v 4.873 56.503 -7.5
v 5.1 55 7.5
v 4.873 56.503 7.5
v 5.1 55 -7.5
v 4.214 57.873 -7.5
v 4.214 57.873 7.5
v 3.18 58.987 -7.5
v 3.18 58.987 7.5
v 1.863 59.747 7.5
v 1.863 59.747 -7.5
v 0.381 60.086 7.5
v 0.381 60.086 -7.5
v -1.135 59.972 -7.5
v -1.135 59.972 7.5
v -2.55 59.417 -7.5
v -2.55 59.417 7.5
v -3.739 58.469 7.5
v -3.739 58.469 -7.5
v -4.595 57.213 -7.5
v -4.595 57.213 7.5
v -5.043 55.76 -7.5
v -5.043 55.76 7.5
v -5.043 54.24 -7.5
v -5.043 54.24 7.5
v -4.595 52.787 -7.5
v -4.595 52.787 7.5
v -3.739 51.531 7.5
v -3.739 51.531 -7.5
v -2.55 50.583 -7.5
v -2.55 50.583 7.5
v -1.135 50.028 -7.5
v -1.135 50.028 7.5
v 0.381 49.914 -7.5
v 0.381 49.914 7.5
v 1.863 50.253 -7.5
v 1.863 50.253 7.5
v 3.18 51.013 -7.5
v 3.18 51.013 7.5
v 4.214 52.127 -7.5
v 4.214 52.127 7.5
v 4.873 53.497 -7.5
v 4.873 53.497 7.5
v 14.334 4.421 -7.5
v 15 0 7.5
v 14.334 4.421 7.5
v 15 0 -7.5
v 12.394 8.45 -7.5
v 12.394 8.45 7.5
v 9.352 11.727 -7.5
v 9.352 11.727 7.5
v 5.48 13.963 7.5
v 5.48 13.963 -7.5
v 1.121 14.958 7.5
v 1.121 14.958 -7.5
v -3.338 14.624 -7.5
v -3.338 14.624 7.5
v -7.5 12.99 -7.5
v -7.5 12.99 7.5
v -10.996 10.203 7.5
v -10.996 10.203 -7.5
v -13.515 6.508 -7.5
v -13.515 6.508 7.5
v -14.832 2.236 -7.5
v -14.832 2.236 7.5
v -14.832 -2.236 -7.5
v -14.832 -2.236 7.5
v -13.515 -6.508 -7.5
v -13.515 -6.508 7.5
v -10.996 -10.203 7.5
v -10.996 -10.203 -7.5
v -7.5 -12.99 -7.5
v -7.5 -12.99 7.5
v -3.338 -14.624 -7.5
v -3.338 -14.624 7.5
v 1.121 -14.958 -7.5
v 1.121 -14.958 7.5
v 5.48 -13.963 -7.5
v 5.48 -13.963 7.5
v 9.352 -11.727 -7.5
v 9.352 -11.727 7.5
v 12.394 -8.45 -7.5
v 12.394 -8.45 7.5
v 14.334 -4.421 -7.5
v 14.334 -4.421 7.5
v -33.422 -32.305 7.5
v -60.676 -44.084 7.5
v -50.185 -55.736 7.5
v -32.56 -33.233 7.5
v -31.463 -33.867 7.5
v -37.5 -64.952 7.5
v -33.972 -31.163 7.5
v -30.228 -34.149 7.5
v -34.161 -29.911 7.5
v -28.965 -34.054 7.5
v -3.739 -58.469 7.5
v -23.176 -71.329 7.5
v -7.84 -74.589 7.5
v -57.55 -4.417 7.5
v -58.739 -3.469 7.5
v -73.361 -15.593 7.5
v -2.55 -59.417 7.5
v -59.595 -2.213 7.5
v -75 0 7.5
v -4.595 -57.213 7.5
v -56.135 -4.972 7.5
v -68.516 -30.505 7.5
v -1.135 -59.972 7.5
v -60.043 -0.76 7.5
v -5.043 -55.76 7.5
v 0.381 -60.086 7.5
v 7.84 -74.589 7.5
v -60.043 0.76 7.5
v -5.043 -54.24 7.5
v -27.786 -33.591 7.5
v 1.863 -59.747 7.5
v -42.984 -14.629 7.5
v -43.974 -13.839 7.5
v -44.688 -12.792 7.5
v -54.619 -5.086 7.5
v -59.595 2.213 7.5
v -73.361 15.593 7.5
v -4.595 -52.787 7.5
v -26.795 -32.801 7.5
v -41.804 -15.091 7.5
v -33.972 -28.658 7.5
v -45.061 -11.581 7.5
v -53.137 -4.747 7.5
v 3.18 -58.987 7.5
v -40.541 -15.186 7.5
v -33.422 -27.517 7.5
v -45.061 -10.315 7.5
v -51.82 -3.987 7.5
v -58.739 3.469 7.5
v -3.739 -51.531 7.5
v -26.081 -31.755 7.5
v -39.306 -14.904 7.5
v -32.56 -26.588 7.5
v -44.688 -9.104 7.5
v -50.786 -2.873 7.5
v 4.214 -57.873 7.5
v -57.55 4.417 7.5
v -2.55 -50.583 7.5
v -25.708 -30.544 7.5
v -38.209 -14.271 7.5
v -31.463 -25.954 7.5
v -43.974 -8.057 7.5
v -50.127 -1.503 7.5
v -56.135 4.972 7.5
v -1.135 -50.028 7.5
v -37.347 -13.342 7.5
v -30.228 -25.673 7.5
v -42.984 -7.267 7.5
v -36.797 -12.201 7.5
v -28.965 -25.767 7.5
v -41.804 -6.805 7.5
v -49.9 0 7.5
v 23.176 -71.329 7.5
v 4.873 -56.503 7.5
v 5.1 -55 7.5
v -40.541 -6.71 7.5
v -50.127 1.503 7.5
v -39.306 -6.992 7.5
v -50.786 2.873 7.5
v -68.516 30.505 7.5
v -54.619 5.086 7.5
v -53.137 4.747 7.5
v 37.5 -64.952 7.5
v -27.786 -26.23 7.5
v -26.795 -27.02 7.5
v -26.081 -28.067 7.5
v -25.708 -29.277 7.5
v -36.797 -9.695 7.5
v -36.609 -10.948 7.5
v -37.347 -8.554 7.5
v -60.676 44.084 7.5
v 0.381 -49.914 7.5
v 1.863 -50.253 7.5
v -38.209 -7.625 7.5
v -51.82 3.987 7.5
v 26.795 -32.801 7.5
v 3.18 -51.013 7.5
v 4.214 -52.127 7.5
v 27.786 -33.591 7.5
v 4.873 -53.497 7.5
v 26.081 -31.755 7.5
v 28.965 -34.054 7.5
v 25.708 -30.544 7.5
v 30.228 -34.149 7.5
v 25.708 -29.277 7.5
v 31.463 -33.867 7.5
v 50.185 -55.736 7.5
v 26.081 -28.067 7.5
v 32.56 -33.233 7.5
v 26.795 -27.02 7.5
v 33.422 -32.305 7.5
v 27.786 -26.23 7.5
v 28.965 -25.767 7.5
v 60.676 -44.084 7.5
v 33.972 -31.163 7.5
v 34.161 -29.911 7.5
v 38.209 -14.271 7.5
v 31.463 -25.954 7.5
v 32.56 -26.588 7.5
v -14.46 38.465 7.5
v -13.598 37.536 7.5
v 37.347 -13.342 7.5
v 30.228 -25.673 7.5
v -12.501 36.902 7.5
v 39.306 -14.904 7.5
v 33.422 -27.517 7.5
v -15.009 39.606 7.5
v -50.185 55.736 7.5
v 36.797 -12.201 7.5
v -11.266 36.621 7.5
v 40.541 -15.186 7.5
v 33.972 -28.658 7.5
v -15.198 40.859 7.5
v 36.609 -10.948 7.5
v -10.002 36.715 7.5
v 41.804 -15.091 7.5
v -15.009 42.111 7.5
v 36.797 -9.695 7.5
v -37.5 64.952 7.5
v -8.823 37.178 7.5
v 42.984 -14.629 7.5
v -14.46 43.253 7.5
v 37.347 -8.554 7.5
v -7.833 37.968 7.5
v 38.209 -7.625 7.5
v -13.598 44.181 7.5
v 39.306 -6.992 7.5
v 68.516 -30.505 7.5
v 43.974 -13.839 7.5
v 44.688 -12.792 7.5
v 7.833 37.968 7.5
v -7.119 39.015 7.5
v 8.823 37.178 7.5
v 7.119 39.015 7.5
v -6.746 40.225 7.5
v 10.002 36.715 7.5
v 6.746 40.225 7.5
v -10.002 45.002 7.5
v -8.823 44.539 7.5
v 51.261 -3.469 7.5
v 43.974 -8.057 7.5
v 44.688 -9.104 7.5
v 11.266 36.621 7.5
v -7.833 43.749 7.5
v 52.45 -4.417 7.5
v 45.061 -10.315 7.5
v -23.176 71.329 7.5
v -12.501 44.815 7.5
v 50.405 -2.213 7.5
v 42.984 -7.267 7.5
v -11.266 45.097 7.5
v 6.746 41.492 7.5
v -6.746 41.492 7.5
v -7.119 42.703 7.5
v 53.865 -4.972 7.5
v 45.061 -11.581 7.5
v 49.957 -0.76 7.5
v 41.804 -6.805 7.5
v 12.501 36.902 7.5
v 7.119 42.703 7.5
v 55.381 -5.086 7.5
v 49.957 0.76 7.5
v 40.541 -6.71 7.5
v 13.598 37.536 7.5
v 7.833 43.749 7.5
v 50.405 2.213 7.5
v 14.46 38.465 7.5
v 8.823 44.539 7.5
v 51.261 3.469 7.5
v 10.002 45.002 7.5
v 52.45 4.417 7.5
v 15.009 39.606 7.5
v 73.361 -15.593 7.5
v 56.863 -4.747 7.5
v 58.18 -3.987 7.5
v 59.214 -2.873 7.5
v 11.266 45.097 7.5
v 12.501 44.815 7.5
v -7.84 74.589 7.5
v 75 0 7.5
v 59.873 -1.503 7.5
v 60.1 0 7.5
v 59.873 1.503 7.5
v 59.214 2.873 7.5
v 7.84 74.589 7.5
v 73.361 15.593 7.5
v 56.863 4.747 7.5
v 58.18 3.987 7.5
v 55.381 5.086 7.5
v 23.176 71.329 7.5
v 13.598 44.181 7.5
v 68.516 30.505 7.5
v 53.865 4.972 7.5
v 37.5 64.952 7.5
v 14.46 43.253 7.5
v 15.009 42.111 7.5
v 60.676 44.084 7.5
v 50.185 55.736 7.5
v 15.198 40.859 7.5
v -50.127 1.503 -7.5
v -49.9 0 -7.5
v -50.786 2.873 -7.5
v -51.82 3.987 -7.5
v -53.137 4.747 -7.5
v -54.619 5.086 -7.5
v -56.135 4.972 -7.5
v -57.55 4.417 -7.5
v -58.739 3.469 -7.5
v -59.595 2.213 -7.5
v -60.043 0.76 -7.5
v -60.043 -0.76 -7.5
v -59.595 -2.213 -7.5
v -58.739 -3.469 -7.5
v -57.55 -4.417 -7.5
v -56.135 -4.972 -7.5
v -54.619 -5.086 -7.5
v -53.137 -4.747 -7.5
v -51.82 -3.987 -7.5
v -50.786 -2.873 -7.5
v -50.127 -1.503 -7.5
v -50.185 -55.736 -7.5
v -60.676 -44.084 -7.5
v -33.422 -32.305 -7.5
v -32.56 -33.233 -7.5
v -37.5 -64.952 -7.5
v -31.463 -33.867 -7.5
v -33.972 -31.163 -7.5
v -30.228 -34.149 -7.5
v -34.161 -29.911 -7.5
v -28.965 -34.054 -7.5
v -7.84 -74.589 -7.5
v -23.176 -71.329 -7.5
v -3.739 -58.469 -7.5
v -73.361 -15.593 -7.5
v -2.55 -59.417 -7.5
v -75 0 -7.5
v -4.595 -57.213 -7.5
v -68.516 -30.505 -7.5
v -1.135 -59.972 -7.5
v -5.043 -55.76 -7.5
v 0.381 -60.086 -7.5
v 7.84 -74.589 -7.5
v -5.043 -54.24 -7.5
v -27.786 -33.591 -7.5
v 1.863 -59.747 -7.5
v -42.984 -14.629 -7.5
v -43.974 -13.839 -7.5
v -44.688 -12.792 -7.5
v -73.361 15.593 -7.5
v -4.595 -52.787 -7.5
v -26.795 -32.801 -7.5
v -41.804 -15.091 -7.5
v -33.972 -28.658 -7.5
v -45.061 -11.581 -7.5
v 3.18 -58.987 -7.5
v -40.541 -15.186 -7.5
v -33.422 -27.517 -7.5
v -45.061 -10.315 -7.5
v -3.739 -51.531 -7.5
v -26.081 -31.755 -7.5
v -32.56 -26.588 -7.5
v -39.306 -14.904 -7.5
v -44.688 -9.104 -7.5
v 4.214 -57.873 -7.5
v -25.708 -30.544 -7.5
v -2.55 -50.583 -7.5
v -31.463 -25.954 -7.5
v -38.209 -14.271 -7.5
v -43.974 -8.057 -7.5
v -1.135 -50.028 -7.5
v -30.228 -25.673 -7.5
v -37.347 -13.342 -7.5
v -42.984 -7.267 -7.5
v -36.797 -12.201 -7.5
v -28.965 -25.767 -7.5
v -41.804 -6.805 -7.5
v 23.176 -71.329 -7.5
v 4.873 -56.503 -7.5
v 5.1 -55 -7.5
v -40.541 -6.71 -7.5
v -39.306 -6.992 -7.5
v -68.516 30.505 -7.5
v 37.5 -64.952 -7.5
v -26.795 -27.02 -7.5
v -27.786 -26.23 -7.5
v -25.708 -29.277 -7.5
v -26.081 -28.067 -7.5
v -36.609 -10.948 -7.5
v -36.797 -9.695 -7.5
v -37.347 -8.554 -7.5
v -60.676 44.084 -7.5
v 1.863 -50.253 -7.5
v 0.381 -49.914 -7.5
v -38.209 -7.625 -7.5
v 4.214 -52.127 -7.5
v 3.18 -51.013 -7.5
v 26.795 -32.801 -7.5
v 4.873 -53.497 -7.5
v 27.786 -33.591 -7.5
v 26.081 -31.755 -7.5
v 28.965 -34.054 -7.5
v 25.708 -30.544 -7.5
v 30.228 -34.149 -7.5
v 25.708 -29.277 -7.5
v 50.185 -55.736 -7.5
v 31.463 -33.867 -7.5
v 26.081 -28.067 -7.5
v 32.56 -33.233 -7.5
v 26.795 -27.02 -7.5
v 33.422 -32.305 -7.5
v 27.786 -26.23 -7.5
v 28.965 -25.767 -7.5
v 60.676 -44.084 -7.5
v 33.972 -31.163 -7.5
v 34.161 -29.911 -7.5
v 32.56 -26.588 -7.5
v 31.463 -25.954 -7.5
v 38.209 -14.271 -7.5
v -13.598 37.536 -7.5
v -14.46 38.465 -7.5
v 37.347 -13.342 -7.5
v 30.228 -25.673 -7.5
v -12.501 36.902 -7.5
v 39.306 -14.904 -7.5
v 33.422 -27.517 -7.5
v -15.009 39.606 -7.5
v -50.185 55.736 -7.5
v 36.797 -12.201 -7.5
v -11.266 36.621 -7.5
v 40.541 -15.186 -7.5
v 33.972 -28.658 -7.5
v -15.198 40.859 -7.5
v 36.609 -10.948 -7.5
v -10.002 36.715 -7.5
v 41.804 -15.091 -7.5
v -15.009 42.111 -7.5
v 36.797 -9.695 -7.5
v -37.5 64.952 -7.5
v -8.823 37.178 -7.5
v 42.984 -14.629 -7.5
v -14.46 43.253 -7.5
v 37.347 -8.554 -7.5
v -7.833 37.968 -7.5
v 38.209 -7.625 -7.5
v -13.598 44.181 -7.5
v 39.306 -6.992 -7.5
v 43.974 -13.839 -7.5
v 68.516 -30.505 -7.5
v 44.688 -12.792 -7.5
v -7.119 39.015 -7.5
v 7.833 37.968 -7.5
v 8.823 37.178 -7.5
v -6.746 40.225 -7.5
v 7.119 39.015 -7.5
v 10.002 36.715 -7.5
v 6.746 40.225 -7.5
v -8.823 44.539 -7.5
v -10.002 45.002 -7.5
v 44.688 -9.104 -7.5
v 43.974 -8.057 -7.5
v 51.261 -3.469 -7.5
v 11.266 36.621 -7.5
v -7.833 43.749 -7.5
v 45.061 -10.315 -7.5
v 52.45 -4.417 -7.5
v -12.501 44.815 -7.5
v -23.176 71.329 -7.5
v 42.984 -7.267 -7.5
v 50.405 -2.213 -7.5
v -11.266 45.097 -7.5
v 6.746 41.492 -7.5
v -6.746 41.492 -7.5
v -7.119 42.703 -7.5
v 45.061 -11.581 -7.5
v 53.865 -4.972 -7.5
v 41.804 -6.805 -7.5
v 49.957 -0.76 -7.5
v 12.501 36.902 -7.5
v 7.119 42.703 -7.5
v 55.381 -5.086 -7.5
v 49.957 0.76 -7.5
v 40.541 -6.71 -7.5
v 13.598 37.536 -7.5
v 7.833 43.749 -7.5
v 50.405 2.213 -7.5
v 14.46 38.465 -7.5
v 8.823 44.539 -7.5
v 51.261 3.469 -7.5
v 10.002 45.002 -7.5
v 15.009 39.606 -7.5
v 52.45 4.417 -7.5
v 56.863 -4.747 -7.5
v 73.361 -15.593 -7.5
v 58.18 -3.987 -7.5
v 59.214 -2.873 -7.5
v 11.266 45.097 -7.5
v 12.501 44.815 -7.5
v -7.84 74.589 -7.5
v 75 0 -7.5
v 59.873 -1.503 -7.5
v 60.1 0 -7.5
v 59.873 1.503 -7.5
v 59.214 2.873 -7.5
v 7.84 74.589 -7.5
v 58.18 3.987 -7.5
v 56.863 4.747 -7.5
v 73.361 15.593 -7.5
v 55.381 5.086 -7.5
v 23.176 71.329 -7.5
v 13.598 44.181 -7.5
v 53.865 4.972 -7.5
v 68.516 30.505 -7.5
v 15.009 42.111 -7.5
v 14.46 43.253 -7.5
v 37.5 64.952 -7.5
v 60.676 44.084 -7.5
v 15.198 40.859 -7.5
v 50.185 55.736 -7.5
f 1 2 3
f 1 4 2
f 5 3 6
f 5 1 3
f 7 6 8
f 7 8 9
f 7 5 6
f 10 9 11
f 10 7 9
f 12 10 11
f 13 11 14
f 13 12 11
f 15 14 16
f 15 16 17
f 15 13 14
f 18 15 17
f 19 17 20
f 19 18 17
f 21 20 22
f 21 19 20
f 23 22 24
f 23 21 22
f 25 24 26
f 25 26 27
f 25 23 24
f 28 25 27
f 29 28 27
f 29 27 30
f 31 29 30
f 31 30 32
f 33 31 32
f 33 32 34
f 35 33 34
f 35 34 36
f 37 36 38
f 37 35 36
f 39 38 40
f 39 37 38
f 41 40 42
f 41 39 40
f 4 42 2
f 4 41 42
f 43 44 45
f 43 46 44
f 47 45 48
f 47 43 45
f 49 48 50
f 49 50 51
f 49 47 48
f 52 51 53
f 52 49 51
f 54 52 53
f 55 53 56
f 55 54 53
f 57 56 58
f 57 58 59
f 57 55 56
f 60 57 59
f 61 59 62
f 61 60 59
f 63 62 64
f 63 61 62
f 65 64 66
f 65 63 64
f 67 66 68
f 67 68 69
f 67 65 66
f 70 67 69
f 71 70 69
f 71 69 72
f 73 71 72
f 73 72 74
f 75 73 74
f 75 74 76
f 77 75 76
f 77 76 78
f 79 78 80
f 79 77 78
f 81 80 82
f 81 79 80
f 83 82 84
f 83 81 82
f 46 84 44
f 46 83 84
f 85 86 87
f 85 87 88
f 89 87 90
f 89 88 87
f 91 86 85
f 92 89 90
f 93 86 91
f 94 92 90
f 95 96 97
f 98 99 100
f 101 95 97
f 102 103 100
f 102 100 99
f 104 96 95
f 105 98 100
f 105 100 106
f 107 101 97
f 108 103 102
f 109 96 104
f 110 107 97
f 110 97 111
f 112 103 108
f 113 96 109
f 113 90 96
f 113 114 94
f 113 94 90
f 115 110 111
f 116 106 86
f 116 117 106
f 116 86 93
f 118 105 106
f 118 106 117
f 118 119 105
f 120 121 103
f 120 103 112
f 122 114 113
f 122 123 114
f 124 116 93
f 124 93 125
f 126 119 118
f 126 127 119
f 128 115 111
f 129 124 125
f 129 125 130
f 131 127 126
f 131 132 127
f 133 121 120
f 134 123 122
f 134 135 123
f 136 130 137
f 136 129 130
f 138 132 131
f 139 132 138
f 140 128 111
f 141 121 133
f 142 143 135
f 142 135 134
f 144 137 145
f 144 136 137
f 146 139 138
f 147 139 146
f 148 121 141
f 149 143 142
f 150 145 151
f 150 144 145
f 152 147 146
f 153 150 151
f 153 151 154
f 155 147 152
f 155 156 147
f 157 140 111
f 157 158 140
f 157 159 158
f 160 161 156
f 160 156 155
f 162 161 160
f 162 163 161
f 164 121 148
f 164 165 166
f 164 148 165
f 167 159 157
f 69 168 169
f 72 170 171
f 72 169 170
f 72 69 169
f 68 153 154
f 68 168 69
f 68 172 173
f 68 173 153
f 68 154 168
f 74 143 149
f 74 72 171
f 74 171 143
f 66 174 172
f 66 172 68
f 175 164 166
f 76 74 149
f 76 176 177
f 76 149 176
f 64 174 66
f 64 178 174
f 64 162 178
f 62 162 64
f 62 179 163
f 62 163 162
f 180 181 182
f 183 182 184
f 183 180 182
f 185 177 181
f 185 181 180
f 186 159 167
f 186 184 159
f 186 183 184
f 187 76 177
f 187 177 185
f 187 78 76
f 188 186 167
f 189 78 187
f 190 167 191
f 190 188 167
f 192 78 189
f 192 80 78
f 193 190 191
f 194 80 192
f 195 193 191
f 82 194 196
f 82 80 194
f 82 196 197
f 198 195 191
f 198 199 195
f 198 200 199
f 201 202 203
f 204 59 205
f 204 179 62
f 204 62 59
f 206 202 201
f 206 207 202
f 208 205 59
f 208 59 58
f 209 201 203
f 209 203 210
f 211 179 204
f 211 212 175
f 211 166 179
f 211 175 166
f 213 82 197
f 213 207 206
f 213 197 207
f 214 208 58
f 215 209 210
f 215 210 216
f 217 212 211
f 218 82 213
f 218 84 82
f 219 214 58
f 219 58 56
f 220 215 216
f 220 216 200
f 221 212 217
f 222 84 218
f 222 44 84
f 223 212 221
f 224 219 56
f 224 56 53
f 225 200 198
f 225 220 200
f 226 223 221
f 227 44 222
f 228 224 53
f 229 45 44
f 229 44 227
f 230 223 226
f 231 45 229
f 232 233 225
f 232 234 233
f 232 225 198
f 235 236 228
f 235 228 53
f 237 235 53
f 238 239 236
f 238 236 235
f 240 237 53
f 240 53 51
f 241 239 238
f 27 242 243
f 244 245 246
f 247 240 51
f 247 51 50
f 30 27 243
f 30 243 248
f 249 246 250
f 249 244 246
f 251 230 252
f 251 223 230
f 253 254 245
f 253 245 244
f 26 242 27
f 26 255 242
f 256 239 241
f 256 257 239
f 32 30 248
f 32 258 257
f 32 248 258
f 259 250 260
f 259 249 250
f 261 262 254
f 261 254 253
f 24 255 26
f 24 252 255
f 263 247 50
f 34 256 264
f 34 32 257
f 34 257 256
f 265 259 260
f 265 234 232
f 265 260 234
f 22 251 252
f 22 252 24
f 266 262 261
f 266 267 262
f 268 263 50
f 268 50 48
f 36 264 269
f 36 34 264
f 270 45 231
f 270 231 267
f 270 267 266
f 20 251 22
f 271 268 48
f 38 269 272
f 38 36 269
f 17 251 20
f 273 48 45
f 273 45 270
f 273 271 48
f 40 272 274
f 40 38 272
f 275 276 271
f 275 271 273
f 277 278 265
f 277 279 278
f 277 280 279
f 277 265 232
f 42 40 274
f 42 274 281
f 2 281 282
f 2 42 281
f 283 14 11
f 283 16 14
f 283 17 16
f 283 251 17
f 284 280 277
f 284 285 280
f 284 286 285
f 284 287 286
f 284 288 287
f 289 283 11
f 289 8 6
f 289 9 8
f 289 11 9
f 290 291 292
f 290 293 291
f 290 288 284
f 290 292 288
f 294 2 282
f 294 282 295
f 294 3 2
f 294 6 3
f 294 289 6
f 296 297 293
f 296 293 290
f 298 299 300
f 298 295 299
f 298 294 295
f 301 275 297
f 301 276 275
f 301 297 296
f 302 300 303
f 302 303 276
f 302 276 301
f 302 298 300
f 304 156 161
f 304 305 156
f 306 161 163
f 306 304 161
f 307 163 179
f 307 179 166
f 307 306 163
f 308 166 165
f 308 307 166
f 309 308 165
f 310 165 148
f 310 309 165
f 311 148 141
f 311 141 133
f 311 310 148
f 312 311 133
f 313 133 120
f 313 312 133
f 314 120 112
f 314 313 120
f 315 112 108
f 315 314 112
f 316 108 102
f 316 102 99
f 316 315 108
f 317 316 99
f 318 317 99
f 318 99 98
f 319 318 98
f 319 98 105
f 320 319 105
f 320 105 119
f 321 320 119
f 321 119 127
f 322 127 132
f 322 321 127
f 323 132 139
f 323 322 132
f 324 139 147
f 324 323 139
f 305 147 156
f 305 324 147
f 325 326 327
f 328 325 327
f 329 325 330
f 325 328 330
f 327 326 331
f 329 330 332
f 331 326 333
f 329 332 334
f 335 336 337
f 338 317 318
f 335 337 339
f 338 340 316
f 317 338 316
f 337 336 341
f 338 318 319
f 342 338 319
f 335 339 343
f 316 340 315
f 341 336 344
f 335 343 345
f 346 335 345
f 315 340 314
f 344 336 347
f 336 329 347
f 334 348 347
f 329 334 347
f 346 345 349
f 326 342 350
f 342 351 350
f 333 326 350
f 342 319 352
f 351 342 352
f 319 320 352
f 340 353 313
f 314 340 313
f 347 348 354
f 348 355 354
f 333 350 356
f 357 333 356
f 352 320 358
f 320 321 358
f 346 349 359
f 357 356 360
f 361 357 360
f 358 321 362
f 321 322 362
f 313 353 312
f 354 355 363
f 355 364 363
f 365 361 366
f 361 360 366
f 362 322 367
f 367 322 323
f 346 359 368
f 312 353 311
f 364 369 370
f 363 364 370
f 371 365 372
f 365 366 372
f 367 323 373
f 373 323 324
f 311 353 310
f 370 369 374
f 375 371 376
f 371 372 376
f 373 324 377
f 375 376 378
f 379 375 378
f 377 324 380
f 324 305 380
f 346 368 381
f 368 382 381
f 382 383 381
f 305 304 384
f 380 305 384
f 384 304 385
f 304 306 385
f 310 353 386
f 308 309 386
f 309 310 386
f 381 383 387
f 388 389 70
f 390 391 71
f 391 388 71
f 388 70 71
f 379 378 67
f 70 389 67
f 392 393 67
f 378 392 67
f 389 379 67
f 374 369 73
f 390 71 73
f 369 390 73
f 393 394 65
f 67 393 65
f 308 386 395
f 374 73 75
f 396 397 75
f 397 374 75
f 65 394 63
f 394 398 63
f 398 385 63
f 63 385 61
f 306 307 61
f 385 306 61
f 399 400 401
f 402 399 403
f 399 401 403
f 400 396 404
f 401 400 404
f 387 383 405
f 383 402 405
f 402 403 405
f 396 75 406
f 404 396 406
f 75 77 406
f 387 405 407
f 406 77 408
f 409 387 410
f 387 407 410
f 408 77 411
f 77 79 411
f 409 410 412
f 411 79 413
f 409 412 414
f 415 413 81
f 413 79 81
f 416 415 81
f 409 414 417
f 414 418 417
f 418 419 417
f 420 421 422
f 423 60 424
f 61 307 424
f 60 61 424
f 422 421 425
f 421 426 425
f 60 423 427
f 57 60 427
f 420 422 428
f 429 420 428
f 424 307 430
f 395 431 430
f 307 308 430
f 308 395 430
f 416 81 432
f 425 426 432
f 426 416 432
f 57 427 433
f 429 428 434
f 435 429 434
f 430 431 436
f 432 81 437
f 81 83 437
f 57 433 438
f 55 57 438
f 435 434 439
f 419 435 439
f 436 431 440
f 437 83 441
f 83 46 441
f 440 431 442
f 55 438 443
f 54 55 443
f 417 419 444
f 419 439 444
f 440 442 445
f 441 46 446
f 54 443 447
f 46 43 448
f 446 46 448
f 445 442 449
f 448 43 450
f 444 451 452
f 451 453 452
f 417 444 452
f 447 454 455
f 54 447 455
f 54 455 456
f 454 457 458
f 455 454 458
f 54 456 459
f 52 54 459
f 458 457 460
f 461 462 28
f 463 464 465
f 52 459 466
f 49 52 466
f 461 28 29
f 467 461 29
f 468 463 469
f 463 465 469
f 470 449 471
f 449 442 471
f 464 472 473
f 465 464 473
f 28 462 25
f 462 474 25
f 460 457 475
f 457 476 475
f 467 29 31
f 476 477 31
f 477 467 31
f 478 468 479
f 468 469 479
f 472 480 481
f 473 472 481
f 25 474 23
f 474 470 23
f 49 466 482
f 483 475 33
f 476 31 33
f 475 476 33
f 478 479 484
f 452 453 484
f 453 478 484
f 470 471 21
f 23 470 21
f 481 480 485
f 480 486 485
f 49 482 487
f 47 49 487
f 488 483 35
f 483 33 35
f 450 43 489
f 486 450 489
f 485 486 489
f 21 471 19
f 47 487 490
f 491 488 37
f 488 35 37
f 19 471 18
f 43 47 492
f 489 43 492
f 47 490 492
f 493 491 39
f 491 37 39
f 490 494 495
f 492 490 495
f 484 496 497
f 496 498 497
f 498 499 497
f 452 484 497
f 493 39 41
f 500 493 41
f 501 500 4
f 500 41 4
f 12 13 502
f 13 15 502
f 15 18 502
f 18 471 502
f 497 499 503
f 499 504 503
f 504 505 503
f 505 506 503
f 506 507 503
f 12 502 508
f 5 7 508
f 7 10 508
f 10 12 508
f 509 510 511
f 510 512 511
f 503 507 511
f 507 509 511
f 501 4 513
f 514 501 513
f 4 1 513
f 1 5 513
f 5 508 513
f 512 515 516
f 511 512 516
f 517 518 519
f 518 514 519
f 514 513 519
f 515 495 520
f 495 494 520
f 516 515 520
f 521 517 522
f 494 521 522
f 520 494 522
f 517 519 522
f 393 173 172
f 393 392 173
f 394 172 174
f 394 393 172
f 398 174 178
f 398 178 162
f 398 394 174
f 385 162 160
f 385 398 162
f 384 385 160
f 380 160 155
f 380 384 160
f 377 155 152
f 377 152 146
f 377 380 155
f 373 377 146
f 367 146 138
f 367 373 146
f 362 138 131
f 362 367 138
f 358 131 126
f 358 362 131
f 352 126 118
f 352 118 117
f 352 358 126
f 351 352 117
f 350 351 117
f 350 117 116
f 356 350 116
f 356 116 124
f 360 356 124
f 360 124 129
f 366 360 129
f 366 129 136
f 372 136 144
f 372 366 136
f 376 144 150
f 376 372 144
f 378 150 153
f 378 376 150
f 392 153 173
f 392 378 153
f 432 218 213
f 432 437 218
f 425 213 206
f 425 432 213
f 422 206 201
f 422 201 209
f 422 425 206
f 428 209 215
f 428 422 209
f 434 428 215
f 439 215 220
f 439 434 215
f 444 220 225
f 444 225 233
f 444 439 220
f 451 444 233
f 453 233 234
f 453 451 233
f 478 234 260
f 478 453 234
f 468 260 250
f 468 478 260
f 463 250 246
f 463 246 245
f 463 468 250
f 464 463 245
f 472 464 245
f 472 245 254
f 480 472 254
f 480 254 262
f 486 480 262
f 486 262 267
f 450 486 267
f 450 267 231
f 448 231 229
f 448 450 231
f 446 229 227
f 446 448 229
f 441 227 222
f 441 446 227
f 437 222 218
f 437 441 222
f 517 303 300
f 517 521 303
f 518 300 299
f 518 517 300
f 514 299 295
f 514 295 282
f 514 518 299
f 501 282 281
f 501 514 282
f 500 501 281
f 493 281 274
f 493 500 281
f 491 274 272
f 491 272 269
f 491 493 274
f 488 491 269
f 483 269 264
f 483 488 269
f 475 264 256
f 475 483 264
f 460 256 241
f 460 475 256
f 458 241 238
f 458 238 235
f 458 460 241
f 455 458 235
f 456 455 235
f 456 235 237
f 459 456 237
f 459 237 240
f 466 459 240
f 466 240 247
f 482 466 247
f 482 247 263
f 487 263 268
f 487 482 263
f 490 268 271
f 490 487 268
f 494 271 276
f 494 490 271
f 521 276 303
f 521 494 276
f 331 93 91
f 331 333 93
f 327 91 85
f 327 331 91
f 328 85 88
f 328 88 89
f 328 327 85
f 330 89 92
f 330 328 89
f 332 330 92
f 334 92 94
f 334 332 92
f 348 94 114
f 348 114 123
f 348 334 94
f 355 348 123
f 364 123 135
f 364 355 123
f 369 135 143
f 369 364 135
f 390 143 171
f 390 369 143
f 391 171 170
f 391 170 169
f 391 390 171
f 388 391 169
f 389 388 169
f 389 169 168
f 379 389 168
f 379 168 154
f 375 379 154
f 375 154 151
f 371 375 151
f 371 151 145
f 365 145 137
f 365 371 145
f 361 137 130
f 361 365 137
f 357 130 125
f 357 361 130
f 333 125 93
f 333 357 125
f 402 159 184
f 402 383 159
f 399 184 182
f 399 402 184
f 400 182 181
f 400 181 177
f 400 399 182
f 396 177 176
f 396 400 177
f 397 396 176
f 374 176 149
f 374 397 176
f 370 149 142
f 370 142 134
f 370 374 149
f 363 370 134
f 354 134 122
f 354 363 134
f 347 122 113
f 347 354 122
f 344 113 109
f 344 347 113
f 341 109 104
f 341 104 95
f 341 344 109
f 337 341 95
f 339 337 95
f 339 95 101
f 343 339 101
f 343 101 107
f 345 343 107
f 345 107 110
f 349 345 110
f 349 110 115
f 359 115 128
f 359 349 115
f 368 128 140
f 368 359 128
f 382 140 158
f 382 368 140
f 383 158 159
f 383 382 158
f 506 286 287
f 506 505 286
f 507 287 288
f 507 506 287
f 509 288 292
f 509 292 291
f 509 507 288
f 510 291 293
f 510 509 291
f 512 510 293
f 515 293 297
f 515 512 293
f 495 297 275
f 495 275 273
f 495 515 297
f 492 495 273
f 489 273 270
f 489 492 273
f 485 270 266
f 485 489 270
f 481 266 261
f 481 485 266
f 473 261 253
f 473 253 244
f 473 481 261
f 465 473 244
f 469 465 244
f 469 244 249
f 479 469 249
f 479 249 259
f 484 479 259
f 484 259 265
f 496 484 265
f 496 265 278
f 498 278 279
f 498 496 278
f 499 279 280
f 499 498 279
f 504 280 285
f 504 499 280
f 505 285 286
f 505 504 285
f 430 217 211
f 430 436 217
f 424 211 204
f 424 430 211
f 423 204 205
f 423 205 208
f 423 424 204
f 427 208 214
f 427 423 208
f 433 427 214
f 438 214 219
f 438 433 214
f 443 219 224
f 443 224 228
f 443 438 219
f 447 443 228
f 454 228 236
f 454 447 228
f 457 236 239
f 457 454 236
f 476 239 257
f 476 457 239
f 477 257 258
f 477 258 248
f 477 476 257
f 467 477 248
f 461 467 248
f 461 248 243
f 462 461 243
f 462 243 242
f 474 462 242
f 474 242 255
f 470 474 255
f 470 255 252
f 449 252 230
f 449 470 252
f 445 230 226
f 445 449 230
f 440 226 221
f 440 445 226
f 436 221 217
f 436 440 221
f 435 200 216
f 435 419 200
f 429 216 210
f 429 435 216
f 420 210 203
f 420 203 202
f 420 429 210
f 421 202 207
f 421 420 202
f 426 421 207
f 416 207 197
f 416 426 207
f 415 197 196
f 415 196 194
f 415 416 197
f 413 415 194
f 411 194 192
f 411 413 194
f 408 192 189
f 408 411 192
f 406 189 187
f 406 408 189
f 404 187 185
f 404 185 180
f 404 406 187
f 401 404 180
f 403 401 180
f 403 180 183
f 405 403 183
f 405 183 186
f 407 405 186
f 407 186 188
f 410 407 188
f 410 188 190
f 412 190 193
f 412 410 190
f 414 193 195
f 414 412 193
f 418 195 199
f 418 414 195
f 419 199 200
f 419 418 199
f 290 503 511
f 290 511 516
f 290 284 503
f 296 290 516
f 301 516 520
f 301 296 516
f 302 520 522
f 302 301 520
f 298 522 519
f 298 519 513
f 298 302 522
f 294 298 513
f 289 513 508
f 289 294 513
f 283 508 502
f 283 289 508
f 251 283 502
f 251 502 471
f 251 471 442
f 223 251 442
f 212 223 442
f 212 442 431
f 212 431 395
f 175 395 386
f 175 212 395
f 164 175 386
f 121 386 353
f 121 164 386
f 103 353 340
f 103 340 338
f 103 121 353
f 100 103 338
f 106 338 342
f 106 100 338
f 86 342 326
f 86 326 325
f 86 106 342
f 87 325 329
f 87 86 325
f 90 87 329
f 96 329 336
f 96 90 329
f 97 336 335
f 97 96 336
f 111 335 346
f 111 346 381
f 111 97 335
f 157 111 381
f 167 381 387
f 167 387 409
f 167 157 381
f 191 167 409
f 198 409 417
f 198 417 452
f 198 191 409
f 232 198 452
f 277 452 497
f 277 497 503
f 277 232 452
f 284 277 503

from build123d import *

# Parameters (mm, degrees)
ESQUISSE1_R        = 75
ESQUISSE1_R_2      = 15
ESQUISSE1_R_3      = 5.1
ESQUISSE1_R_4      = 4.25
BOSS_EXTRU_1_DEPTH = 7.5


with BuildPart() as part:
    # Esquisse1 → Boss.-Extru.1 (new body, symmetric)
    with BuildSketch(Plane.XY):
        Circle(ESQUISSE1_R)
        Circle(ESQUISSE1_R_2, mode=Mode.SUBTRACT)
        with Locations((0, 55)):
            Circle(ESQUISSE1_R_3, mode=Mode.SUBTRACT)
        with Locations((-55, 0)):
            Circle(ESQUISSE1_R_3, mode=Mode.SUBTRACT)
        with Locations((0, -55)):
            Circle(ESQUISSE1_R_3, mode=Mode.SUBTRACT)
        with Locations((55, 0)):
            Circle(ESQUISSE1_R_3, mode=Mode.SUBTRACT)
        with Locations((10.948045608, 40.858662452)):
            Circle(ESQUISSE1_R_4, mode=Mode.SUBTRACT)
        with Locations(Location((-10.948045608, 40.858662452, 0), (0, 0, 180))):  # turned: the seam where the file's is
            Circle(ESQUISSE1_R_4, mode=Mode.SUBTRACT)
        with Locations((29.910616844, -29.910616844)):
            Circle(ESQUISSE1_R_4, mode=Mode.SUBTRACT)
        with Locations(Location((40.858662452, -10.948045608, 0), (0, 0, 180))):  # turned: the seam where the file's is
            Circle(ESQUISSE1_R_4, mode=Mode.SUBTRACT)
        with Locations((-40.858662452, -10.948045608)):
            Circle(ESQUISSE1_R_4, mode=Mode.SUBTRACT)
        with Locations(Location((-29.910616844, -29.910616844, 0), (0, 0, 180))):  # turned: the seam where the file's is
            Circle(ESQUISSE1_R_4, mode=Mode.SUBTRACT)
    extrude(amount=BOSS_EXTRU_1_DEPTH, both=True)


solid = part.part
